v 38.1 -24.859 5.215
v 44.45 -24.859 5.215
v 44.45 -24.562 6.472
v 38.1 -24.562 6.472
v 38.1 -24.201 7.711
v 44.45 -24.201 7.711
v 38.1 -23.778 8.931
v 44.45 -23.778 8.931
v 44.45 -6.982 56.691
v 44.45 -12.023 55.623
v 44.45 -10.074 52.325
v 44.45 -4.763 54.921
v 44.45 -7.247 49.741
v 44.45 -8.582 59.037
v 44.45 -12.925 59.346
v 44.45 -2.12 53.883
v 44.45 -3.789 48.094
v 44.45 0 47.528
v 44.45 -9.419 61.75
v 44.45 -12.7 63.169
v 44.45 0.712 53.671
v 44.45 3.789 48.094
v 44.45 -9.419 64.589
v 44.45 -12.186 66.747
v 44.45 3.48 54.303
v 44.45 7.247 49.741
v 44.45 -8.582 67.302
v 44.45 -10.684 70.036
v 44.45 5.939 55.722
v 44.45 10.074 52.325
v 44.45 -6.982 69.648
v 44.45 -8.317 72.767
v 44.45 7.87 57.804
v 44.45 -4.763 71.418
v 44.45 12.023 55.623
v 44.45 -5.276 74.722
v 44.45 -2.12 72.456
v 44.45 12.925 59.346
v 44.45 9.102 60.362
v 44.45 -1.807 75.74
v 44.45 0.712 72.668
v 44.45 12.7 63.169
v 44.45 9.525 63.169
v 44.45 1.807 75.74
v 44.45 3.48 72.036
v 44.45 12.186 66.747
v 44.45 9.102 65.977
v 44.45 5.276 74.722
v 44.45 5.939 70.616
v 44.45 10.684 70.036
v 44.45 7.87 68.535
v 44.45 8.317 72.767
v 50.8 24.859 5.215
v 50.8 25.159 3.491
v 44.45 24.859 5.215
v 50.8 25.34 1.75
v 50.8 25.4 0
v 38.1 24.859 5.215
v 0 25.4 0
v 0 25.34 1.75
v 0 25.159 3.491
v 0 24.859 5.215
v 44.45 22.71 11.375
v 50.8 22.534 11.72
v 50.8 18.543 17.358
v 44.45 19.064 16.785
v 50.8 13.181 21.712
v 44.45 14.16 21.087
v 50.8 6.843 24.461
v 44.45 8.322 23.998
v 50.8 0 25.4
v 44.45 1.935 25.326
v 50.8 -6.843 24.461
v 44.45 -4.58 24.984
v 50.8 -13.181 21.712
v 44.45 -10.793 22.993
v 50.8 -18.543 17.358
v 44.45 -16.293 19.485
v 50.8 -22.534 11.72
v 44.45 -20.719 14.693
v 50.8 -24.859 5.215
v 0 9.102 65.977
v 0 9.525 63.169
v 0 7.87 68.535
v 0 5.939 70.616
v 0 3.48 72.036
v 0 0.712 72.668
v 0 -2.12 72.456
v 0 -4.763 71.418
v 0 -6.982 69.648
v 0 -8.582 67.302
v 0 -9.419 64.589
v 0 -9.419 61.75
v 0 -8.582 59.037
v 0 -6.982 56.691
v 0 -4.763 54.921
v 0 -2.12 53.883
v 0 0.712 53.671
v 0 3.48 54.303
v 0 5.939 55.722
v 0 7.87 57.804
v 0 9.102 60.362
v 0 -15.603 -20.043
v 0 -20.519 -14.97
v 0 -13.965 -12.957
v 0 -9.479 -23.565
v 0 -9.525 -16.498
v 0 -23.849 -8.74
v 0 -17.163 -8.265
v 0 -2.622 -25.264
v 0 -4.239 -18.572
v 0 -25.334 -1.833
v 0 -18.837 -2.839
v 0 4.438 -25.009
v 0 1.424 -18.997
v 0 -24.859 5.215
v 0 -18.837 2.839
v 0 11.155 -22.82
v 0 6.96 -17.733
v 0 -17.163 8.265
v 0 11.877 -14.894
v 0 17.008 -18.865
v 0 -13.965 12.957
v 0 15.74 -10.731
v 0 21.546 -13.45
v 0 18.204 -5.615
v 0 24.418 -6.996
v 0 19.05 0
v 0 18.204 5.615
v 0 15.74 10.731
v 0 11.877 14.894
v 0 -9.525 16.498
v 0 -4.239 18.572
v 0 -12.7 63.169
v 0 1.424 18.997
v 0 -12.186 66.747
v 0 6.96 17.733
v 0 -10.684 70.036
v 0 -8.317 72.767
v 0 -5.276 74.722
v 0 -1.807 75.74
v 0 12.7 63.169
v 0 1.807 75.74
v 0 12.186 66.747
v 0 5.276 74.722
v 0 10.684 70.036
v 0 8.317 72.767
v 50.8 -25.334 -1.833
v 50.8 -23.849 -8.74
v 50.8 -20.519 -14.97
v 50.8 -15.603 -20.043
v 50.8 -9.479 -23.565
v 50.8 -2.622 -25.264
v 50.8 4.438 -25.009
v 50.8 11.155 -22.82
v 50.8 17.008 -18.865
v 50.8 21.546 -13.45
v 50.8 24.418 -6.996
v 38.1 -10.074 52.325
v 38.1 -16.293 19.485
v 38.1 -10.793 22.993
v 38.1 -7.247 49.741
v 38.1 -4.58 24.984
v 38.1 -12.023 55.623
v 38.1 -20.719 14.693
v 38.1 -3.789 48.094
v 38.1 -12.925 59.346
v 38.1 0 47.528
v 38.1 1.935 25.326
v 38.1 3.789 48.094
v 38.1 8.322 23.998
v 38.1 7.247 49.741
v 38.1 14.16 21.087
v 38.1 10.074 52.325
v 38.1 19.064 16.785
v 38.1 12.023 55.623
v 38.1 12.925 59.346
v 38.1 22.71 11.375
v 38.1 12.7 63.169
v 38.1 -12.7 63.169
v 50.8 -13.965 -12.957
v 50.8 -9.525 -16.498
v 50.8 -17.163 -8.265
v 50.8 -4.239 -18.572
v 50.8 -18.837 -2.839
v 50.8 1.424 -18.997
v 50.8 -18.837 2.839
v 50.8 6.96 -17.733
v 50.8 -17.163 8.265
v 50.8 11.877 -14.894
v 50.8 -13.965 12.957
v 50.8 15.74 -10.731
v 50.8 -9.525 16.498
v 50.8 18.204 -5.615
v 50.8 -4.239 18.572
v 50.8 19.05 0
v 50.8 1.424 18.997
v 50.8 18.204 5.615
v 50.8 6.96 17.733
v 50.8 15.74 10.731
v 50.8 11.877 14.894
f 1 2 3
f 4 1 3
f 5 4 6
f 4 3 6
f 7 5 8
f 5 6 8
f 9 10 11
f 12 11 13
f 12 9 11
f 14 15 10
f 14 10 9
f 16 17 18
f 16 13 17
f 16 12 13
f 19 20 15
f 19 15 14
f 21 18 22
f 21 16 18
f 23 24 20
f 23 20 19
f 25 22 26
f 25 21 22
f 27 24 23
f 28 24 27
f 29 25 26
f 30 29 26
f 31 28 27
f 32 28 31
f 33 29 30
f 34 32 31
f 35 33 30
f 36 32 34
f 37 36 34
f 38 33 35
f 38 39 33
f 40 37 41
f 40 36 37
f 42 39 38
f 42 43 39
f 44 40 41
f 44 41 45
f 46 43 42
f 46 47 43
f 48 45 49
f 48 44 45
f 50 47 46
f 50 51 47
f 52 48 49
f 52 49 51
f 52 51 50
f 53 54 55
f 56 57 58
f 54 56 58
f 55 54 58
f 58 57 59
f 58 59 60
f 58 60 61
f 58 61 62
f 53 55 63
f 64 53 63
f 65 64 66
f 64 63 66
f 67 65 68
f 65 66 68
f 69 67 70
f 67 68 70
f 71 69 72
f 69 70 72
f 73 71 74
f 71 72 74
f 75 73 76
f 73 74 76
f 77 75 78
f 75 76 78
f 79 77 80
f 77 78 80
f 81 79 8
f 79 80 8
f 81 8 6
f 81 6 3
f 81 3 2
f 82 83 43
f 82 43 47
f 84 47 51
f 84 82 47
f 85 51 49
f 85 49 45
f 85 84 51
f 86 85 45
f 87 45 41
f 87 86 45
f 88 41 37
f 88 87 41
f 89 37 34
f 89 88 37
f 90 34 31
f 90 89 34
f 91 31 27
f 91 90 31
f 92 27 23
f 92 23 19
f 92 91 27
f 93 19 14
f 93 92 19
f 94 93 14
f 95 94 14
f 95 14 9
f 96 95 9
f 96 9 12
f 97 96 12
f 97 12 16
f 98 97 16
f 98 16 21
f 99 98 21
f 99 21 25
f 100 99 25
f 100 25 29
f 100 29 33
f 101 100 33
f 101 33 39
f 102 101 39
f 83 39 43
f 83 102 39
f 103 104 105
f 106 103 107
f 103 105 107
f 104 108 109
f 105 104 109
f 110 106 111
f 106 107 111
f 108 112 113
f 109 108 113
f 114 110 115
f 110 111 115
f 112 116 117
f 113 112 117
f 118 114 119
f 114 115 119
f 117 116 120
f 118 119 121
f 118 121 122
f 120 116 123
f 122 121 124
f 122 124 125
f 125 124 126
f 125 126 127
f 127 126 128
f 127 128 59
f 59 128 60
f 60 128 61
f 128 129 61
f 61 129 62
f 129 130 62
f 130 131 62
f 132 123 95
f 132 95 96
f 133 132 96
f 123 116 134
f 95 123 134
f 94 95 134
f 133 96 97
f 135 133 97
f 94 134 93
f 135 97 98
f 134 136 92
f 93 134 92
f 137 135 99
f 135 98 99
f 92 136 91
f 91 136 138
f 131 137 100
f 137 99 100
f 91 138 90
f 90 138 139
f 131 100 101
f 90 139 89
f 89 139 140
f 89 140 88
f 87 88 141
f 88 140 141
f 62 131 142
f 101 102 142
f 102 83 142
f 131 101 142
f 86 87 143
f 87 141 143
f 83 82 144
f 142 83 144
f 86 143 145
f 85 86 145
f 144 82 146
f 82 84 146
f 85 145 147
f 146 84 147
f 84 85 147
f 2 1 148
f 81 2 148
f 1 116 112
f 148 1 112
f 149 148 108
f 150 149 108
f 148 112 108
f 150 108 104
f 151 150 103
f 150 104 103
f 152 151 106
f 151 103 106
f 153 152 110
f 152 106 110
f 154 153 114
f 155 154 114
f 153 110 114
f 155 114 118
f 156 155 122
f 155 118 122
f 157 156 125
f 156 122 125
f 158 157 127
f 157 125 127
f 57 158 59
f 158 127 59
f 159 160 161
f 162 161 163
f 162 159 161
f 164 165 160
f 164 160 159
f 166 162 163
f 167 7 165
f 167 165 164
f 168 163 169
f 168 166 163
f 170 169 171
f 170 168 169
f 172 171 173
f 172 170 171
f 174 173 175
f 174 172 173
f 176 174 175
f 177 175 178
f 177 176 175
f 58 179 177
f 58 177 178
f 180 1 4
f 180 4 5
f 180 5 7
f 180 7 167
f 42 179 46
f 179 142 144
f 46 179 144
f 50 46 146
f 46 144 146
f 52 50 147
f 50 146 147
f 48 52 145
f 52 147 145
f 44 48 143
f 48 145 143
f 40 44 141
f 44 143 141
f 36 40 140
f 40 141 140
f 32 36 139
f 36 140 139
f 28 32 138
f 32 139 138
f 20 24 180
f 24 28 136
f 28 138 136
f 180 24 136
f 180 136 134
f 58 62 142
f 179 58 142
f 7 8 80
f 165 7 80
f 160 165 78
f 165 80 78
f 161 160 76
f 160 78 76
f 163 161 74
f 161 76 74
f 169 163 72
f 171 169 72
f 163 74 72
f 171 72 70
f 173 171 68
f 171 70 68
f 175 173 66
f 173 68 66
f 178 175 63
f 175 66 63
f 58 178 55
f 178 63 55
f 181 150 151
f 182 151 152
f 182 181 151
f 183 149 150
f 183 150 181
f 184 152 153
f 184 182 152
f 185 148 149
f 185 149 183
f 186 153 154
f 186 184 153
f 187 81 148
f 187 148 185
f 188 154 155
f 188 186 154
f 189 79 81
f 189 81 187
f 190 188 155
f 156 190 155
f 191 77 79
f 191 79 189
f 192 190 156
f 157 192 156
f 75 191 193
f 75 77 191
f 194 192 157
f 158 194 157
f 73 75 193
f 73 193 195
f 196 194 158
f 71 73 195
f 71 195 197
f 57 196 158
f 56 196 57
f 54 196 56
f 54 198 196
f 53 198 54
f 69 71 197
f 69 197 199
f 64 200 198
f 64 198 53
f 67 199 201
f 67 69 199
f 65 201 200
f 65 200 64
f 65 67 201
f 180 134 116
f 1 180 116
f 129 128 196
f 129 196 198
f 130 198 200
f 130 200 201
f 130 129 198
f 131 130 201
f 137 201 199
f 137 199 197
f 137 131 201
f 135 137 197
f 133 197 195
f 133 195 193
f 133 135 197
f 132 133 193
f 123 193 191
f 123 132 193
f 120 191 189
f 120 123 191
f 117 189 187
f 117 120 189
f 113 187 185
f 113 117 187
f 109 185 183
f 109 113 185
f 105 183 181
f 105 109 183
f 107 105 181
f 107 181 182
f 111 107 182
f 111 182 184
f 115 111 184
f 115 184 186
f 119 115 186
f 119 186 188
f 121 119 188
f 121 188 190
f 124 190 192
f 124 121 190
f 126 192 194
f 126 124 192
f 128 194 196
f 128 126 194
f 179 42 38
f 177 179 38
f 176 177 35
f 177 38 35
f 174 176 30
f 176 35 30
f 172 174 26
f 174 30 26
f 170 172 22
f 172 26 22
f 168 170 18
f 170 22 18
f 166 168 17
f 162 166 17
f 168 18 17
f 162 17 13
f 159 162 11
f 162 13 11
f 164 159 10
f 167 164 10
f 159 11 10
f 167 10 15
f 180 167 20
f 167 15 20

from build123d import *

# Parameters (mm, degrees)
F0_R     = 19.05
F1_DEPTH = 50.8
F2_DEPTH = 44.45
F0_R_2   = 9.525
F3_DEPTH = 44.45
F5_DEPTH = 6.35


with BuildPart() as f1:
    # F0 (on Right) → F1 (new body)
    with BuildSketch(Plane.YZ):
        with BuildLine():
            ThreePointArc((-24.8587950459, 5.2153915354), (-2.6216984795, -25.2643364663), (25.4, 0))
            ThreePointArc((25.4, 0), (25.2643364465, 2.6216986701), (24.8587949672, 5.2153919105))
            ThreePointArc((24.8587949672, 5.2153919105), (-1.916e-07, 25.4), (-24.8587950459, 5.2153915354))
        make_face()
        Circle(F0_R, mode=Mode.SUBTRACT)
    extrude(amount=F1_DEPTH)

    # F0 (on Right) → F2 (join)
    with BuildSketch(Plane.YZ):
        with BuildLine():
            ThreePointArc((-24.8587950459, 5.2153915354), (-1.916e-07, 25.4), (24.8587949672, 5.2153919105))
            Line((24.8587949672, 5.2153919105), (12.7, 63.1694245347))
            ThreePointArc((12.7, 63.1694245347), (0, 50.4694245347), (-12.7, 63.1694245347))
            Line((-12.7, 63.1694245347), (-24.8587950459, 5.2153915354))
        make_face()
    extrude(amount=F2_DEPTH)

    # F0 (on Right) → F3 (join)
    with BuildSketch(Plane.YZ):
        with BuildLine():
            ThreePointArc((-12.7, 63.1694245347), (0, 50.4694245347), (12.7, 63.1694245347))
            ThreePointArc((12.7, 63.1694245347), (0, 75.8694245347), (-12.7, 63.1694245347))
        make_face()
        with Locations((0, 63.1694245347)):
            Circle(F0_R_2, mode=Mode.SUBTRACT)
    extrude(amount=F3_DEPTH)

    # F4 (on face) → F5 (cut)
    with BuildSketch(Plane.YZ.offset(44.45)):
        with BuildLine():
            ThreePointArc((-23.7782567625, 8.9305377965), (1.9345459415, 25.3262222212), (24.8587949734, 5.2153918809))
            Line((24.8587949672, 5.2153919105), (12.7, 63.1694245347))
            ThreePointArc((12.7, 63.1694245347), (0, 47.5284621589), (-12.7, 63.1694245347))
            Line((-12.7, 63.1694245347), (-24.8587950459, 5.2153915354))
            ThreePointArc((-24.8587950459, 5.2153915354), (-24.3893681773, 7.0935689122), (-23.7782567625, 8.9305377965))
        make_face()
    extrude(amount=-F5_DEPTH, mode=Mode.SUBTRACT)


solid = f1.part
